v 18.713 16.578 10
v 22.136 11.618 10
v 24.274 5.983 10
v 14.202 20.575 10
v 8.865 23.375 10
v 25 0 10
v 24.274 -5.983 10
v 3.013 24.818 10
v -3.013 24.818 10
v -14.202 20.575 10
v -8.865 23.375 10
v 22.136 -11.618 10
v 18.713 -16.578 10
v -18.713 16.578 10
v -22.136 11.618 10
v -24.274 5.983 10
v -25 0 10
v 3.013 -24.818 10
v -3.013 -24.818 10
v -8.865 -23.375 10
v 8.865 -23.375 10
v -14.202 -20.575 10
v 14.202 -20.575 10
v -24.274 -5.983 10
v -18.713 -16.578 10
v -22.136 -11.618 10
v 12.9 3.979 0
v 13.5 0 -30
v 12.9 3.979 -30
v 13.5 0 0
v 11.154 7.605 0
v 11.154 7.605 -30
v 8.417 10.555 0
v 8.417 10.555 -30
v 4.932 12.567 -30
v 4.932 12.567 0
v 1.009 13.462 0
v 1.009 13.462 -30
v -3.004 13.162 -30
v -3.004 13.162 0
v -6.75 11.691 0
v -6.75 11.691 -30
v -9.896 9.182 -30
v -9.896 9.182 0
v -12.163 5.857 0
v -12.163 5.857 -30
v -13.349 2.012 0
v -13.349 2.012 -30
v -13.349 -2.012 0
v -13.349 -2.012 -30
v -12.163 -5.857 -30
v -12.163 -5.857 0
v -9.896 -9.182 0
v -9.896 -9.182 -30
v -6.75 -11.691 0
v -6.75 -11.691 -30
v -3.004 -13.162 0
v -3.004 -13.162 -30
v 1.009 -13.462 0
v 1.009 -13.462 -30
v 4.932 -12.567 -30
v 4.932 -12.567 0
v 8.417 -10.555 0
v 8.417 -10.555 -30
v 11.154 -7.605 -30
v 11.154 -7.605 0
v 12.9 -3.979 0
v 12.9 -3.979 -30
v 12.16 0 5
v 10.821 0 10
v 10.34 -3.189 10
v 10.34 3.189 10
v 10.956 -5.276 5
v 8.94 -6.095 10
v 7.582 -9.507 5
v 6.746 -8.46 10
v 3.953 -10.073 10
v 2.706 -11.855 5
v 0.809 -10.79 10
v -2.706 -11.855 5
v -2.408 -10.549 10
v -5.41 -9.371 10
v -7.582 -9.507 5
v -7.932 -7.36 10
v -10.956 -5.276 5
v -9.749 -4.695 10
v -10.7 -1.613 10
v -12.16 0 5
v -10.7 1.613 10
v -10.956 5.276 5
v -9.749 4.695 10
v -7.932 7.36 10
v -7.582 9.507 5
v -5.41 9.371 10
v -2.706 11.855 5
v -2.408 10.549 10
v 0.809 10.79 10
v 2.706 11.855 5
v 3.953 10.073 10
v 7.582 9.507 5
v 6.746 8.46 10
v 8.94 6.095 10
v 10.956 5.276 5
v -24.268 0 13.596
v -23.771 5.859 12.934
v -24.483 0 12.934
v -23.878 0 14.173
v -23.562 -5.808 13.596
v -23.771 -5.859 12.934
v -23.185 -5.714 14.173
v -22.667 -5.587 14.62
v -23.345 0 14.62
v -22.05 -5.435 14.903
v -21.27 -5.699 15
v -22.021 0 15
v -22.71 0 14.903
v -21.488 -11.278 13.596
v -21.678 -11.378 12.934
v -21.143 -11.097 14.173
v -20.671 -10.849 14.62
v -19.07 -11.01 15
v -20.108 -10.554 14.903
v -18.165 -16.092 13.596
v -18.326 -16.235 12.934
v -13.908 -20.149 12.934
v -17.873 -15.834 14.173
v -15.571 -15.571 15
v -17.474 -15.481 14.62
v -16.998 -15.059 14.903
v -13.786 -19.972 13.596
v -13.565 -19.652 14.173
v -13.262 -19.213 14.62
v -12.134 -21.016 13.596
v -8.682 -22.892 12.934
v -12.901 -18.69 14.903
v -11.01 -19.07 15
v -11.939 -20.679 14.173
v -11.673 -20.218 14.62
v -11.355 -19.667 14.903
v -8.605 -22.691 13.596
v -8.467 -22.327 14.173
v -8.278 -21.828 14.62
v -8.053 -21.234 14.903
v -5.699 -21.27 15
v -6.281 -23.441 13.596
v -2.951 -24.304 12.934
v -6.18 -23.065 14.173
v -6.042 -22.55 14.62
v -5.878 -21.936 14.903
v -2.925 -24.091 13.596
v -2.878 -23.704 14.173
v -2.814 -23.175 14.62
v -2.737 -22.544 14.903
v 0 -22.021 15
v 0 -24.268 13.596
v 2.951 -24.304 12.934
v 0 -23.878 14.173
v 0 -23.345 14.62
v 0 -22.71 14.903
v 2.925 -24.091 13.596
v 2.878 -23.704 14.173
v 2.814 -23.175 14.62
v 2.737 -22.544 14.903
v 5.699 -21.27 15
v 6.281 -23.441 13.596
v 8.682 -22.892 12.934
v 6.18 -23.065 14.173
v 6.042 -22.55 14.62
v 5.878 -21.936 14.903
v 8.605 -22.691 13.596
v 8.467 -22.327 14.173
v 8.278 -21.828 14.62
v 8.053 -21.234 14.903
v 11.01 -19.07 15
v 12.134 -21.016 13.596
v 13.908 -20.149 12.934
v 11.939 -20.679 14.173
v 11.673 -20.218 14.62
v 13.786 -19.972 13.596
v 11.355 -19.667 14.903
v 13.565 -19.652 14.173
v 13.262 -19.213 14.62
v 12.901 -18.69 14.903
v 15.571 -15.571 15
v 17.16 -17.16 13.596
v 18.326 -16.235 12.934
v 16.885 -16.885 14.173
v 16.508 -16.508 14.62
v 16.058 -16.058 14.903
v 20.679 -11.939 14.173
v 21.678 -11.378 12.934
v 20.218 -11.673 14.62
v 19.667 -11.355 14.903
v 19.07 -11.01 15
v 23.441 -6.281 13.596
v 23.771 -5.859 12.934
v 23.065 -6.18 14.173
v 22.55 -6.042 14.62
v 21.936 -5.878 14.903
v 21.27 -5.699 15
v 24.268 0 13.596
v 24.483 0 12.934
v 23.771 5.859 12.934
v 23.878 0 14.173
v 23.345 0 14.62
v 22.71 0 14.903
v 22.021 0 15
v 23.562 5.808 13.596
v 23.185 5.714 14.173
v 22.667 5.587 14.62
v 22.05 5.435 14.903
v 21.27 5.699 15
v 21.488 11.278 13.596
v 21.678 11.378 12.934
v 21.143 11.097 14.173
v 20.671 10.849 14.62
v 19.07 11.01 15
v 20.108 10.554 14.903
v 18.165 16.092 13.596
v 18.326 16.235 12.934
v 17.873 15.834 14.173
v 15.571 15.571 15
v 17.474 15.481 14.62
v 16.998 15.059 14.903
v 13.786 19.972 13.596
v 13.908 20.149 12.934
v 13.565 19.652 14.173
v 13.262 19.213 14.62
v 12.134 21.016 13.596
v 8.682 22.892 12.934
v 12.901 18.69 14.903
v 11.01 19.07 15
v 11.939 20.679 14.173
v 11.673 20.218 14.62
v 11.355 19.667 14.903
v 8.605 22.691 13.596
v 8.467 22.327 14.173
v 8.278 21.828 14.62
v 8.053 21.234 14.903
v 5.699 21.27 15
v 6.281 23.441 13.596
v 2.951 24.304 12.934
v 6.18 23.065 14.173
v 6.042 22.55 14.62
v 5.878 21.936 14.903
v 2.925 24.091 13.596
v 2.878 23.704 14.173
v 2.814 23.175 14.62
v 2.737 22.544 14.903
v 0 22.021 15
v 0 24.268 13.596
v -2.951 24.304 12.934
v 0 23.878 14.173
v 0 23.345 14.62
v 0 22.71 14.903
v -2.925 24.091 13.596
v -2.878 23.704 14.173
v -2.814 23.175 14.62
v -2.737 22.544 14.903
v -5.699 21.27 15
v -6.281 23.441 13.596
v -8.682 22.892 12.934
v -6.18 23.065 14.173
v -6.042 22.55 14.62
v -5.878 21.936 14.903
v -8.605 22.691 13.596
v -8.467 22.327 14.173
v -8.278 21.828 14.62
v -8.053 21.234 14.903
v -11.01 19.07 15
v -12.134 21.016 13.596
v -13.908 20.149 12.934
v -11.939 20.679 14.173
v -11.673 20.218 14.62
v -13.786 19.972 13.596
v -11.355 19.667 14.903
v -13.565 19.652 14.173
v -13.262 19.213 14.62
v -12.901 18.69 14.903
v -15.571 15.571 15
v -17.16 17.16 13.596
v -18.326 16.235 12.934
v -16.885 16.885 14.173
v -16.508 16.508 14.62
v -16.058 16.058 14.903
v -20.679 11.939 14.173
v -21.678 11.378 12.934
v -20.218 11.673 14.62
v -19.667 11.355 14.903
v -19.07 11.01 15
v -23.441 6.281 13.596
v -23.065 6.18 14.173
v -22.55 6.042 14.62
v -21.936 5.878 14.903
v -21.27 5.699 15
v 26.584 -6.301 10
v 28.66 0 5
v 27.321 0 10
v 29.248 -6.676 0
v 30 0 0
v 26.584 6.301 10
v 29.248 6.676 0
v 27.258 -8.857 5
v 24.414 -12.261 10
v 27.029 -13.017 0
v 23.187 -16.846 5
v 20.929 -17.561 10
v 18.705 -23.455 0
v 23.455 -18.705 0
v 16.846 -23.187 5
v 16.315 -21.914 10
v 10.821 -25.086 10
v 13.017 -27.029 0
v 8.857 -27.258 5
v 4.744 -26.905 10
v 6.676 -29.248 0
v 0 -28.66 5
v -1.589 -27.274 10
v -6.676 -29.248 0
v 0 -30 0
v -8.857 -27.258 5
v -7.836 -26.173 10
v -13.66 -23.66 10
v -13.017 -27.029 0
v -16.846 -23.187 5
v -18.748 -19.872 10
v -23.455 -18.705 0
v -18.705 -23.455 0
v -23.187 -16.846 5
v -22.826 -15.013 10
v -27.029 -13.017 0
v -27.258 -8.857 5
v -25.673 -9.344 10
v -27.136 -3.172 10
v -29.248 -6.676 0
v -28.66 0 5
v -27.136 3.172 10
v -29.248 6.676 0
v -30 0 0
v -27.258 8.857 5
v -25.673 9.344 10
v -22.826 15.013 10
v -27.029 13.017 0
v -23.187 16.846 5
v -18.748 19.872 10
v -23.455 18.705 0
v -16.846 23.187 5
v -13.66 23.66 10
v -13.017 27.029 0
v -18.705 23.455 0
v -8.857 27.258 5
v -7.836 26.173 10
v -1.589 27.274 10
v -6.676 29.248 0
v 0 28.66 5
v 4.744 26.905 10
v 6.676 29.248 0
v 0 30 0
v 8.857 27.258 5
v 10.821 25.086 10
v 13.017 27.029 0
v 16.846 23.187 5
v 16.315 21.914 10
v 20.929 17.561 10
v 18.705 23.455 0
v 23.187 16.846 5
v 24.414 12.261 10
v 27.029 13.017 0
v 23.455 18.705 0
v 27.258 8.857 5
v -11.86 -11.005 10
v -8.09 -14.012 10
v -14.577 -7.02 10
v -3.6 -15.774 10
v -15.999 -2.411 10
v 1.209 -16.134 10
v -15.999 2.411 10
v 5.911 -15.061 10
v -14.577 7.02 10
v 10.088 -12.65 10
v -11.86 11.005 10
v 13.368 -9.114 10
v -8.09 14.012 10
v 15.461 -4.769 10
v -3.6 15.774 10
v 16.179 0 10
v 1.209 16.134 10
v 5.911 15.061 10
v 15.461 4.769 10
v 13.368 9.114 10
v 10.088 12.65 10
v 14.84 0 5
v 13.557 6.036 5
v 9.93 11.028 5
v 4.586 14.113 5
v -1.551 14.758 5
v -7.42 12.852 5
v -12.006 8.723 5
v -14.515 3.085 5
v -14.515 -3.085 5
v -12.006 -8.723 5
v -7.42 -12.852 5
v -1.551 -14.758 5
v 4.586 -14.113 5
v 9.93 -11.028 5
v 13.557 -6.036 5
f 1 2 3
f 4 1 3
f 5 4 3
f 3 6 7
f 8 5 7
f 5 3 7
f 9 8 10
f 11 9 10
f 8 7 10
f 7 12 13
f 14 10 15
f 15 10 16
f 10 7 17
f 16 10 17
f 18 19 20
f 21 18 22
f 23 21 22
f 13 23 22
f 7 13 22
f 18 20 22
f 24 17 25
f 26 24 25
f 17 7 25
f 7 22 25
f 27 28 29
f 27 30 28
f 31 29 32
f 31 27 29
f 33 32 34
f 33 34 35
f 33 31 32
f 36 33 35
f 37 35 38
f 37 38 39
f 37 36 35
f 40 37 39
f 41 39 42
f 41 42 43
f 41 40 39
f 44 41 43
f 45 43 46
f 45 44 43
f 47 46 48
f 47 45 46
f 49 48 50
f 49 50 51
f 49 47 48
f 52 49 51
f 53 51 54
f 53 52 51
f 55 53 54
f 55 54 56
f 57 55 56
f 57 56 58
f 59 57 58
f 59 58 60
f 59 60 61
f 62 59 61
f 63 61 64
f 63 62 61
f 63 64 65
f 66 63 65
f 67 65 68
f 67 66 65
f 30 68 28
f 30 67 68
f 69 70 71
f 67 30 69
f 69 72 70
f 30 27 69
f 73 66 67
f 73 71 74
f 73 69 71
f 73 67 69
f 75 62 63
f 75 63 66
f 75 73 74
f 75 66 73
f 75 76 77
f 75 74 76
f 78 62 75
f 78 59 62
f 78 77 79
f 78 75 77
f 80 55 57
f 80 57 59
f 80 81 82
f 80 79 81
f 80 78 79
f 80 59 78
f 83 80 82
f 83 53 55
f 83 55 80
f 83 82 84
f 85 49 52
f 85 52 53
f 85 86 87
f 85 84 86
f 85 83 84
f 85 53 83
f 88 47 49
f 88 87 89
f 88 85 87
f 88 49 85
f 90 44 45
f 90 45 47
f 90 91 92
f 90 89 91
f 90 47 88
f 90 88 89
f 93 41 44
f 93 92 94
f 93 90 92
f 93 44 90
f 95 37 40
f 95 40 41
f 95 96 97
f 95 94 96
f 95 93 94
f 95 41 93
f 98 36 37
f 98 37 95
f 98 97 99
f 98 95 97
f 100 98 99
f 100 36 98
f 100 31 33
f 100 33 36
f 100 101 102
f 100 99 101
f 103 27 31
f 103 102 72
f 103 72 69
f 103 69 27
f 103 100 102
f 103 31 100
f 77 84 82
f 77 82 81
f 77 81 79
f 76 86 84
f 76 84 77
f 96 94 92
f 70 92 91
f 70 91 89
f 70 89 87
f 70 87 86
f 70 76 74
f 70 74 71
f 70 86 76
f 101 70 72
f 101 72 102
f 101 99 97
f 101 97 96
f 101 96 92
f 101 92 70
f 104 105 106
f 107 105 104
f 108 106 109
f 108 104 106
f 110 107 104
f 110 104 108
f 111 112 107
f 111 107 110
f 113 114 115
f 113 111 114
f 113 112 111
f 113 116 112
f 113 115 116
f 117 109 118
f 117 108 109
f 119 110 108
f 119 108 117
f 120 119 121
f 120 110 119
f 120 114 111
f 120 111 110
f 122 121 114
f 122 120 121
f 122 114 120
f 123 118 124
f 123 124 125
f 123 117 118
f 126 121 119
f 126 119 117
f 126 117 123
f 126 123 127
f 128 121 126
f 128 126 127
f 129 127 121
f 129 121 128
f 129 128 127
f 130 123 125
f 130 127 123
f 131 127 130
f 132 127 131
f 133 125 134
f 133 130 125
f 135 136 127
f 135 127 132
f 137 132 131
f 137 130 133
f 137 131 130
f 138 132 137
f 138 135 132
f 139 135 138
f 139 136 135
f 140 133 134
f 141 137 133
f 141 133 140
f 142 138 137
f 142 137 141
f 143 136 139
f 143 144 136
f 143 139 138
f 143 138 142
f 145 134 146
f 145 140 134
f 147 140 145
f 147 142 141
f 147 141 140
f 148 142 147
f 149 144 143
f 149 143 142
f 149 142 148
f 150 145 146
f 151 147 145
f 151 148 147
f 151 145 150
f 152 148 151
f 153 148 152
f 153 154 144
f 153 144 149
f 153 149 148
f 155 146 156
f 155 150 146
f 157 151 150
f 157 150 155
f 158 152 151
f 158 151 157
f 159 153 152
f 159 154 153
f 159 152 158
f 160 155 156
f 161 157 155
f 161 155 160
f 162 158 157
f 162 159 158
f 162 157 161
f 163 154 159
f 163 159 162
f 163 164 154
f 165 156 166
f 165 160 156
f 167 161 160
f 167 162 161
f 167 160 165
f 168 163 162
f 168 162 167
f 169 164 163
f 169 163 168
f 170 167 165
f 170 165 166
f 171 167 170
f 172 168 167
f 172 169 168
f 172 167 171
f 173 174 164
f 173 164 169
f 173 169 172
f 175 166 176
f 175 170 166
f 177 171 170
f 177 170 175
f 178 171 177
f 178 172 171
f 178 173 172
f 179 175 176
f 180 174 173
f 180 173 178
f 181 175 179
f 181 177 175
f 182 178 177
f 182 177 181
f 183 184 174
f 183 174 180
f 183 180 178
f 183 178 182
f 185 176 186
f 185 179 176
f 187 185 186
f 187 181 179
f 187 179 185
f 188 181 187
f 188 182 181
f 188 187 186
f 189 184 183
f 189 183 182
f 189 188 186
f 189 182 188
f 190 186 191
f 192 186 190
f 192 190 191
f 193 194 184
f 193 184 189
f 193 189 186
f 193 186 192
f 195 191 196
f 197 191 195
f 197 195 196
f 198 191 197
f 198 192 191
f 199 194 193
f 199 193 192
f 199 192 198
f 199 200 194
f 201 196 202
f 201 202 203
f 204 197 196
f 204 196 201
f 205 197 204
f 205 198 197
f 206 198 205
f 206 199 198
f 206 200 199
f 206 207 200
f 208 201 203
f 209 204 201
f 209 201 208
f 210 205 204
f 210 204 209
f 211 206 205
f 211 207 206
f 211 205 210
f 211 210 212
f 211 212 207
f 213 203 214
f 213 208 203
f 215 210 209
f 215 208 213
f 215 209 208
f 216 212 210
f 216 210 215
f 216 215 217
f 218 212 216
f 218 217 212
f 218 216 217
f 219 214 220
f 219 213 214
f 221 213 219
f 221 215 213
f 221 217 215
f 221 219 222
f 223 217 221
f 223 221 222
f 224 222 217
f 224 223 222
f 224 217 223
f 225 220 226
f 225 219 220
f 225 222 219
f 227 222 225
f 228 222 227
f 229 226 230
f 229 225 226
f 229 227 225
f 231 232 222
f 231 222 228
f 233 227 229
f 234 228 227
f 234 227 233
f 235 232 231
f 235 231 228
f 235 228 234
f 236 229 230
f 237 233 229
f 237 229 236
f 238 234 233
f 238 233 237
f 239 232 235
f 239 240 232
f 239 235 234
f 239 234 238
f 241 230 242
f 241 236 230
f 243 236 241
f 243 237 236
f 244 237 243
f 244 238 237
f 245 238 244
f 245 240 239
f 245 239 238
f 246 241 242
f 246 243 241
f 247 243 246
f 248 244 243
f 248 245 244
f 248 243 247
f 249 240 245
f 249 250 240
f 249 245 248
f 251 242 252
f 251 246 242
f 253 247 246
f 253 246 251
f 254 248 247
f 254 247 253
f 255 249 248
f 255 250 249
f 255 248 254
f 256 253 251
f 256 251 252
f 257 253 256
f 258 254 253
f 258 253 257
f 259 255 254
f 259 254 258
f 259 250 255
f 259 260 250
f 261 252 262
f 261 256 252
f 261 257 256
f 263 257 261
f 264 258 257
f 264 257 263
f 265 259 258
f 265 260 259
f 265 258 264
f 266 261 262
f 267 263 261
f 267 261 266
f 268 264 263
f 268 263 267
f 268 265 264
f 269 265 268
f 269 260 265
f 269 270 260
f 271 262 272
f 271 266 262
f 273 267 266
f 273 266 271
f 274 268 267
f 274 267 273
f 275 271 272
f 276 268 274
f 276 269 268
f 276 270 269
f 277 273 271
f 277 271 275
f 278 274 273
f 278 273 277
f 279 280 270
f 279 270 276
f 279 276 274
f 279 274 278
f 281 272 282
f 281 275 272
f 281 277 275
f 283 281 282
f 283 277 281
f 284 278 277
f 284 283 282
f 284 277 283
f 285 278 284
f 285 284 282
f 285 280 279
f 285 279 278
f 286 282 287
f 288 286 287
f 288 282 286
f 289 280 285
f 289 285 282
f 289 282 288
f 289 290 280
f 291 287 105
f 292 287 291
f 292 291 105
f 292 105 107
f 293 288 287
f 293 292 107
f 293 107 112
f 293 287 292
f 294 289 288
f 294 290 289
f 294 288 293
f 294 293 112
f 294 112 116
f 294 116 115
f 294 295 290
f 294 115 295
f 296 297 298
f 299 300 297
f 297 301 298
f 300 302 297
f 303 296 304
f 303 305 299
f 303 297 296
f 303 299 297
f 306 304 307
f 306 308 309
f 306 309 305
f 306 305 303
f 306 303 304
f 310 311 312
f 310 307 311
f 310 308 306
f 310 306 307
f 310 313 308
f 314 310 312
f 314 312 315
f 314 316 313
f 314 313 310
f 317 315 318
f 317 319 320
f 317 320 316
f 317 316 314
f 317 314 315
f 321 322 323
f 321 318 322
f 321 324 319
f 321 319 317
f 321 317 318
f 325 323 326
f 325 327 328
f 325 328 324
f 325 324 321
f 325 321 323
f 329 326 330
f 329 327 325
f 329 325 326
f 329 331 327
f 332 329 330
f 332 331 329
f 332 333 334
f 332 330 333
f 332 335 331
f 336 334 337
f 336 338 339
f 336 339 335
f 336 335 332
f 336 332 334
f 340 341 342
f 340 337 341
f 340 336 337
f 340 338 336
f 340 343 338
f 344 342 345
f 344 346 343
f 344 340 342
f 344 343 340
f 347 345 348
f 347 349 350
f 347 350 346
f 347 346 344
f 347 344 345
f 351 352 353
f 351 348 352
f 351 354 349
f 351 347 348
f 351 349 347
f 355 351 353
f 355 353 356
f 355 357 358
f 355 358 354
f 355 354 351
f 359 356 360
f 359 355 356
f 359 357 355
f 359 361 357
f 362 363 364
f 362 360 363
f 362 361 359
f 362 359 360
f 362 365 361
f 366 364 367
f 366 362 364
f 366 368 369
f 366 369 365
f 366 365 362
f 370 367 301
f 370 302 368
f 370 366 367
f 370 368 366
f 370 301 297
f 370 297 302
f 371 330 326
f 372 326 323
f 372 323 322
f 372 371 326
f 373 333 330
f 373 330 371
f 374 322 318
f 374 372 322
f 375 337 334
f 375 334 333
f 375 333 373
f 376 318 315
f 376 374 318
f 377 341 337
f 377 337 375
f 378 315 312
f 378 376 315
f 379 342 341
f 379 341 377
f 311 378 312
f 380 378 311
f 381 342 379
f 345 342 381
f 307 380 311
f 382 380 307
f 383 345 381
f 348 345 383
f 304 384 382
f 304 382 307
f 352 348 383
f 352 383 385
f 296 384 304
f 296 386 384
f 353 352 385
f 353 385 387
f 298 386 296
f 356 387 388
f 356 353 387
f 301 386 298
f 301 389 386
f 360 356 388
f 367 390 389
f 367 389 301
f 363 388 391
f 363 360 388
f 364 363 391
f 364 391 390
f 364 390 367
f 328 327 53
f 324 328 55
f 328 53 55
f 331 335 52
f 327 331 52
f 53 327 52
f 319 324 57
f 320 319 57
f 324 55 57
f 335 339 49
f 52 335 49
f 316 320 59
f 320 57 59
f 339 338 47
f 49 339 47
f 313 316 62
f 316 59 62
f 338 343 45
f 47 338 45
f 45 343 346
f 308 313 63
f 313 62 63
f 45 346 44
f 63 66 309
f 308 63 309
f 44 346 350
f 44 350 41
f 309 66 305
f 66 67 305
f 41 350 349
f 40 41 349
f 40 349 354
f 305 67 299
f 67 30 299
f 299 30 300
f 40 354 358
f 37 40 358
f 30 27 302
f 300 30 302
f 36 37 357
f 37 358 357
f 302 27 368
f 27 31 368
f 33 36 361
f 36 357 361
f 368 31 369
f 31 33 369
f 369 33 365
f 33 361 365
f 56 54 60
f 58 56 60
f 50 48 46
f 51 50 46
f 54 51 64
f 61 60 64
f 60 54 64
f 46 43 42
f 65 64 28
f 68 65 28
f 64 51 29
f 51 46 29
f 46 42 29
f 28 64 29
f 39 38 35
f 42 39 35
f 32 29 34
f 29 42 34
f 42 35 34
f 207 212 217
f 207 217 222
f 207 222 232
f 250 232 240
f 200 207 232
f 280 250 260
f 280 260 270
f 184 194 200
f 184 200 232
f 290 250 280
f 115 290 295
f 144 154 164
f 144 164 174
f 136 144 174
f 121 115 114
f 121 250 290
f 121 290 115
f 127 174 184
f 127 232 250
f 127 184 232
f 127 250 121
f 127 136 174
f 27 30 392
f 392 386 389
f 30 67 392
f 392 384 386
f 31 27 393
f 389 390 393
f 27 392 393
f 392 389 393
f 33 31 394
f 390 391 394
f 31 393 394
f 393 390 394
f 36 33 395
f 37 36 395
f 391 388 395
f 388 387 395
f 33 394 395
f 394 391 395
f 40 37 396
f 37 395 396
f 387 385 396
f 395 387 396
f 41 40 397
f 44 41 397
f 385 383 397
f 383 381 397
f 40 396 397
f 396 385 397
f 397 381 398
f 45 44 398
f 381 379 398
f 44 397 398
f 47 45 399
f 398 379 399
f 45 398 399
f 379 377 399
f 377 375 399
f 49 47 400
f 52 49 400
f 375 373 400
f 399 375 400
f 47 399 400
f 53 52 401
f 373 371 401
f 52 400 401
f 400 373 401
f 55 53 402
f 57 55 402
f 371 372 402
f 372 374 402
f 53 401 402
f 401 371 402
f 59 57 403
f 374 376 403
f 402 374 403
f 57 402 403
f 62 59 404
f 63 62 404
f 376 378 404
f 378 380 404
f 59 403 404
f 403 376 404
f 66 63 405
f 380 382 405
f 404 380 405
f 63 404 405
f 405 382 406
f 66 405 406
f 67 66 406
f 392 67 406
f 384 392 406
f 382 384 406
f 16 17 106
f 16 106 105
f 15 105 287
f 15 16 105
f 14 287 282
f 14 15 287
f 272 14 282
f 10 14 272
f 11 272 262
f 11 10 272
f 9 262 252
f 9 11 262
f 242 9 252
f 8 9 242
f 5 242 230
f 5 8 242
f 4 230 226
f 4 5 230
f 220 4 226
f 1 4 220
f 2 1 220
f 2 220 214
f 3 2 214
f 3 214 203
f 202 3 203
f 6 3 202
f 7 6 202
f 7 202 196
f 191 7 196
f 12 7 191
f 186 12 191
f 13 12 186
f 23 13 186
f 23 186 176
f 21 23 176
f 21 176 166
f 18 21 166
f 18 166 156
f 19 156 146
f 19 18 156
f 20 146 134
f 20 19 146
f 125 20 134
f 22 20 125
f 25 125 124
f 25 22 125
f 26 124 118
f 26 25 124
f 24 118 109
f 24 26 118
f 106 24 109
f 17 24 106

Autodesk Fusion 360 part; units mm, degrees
sketch "Sketch1" plane through (0, 0, 0) normal (0, 0, 1) x (1, 0, 0)
  circle A0 centre (0, 0) radius 13.5
  circle A1 centre (0, 0) radius 30
  dimension "d1" = 27
  dimension "d2" = 60
extrude "Extrude1" add sketch "Sketch1" against normal blind 30 contours A0 makes body 1
extrude "Extrude2" add sketch "Sketch1" along normal blind 10 draft -15 contours A0 | A1 bodies 1
sketch "Sketch2" plane through (0, 0, 10) normal (0, 0, 1) x (-1, 0, 0)
  circle A0 centre (0, 0) radius 27.3205
  circle A1 centre (0, 0) radius 25
extrude "Extrude3" add sketch "Sketch2" along normal blind 5 draft -10 separate body contours A1 makes body 2
fillet "Fillet1" radius 2.5 1 edges at (22.4862, -8.7216, 15) on bodies 2
